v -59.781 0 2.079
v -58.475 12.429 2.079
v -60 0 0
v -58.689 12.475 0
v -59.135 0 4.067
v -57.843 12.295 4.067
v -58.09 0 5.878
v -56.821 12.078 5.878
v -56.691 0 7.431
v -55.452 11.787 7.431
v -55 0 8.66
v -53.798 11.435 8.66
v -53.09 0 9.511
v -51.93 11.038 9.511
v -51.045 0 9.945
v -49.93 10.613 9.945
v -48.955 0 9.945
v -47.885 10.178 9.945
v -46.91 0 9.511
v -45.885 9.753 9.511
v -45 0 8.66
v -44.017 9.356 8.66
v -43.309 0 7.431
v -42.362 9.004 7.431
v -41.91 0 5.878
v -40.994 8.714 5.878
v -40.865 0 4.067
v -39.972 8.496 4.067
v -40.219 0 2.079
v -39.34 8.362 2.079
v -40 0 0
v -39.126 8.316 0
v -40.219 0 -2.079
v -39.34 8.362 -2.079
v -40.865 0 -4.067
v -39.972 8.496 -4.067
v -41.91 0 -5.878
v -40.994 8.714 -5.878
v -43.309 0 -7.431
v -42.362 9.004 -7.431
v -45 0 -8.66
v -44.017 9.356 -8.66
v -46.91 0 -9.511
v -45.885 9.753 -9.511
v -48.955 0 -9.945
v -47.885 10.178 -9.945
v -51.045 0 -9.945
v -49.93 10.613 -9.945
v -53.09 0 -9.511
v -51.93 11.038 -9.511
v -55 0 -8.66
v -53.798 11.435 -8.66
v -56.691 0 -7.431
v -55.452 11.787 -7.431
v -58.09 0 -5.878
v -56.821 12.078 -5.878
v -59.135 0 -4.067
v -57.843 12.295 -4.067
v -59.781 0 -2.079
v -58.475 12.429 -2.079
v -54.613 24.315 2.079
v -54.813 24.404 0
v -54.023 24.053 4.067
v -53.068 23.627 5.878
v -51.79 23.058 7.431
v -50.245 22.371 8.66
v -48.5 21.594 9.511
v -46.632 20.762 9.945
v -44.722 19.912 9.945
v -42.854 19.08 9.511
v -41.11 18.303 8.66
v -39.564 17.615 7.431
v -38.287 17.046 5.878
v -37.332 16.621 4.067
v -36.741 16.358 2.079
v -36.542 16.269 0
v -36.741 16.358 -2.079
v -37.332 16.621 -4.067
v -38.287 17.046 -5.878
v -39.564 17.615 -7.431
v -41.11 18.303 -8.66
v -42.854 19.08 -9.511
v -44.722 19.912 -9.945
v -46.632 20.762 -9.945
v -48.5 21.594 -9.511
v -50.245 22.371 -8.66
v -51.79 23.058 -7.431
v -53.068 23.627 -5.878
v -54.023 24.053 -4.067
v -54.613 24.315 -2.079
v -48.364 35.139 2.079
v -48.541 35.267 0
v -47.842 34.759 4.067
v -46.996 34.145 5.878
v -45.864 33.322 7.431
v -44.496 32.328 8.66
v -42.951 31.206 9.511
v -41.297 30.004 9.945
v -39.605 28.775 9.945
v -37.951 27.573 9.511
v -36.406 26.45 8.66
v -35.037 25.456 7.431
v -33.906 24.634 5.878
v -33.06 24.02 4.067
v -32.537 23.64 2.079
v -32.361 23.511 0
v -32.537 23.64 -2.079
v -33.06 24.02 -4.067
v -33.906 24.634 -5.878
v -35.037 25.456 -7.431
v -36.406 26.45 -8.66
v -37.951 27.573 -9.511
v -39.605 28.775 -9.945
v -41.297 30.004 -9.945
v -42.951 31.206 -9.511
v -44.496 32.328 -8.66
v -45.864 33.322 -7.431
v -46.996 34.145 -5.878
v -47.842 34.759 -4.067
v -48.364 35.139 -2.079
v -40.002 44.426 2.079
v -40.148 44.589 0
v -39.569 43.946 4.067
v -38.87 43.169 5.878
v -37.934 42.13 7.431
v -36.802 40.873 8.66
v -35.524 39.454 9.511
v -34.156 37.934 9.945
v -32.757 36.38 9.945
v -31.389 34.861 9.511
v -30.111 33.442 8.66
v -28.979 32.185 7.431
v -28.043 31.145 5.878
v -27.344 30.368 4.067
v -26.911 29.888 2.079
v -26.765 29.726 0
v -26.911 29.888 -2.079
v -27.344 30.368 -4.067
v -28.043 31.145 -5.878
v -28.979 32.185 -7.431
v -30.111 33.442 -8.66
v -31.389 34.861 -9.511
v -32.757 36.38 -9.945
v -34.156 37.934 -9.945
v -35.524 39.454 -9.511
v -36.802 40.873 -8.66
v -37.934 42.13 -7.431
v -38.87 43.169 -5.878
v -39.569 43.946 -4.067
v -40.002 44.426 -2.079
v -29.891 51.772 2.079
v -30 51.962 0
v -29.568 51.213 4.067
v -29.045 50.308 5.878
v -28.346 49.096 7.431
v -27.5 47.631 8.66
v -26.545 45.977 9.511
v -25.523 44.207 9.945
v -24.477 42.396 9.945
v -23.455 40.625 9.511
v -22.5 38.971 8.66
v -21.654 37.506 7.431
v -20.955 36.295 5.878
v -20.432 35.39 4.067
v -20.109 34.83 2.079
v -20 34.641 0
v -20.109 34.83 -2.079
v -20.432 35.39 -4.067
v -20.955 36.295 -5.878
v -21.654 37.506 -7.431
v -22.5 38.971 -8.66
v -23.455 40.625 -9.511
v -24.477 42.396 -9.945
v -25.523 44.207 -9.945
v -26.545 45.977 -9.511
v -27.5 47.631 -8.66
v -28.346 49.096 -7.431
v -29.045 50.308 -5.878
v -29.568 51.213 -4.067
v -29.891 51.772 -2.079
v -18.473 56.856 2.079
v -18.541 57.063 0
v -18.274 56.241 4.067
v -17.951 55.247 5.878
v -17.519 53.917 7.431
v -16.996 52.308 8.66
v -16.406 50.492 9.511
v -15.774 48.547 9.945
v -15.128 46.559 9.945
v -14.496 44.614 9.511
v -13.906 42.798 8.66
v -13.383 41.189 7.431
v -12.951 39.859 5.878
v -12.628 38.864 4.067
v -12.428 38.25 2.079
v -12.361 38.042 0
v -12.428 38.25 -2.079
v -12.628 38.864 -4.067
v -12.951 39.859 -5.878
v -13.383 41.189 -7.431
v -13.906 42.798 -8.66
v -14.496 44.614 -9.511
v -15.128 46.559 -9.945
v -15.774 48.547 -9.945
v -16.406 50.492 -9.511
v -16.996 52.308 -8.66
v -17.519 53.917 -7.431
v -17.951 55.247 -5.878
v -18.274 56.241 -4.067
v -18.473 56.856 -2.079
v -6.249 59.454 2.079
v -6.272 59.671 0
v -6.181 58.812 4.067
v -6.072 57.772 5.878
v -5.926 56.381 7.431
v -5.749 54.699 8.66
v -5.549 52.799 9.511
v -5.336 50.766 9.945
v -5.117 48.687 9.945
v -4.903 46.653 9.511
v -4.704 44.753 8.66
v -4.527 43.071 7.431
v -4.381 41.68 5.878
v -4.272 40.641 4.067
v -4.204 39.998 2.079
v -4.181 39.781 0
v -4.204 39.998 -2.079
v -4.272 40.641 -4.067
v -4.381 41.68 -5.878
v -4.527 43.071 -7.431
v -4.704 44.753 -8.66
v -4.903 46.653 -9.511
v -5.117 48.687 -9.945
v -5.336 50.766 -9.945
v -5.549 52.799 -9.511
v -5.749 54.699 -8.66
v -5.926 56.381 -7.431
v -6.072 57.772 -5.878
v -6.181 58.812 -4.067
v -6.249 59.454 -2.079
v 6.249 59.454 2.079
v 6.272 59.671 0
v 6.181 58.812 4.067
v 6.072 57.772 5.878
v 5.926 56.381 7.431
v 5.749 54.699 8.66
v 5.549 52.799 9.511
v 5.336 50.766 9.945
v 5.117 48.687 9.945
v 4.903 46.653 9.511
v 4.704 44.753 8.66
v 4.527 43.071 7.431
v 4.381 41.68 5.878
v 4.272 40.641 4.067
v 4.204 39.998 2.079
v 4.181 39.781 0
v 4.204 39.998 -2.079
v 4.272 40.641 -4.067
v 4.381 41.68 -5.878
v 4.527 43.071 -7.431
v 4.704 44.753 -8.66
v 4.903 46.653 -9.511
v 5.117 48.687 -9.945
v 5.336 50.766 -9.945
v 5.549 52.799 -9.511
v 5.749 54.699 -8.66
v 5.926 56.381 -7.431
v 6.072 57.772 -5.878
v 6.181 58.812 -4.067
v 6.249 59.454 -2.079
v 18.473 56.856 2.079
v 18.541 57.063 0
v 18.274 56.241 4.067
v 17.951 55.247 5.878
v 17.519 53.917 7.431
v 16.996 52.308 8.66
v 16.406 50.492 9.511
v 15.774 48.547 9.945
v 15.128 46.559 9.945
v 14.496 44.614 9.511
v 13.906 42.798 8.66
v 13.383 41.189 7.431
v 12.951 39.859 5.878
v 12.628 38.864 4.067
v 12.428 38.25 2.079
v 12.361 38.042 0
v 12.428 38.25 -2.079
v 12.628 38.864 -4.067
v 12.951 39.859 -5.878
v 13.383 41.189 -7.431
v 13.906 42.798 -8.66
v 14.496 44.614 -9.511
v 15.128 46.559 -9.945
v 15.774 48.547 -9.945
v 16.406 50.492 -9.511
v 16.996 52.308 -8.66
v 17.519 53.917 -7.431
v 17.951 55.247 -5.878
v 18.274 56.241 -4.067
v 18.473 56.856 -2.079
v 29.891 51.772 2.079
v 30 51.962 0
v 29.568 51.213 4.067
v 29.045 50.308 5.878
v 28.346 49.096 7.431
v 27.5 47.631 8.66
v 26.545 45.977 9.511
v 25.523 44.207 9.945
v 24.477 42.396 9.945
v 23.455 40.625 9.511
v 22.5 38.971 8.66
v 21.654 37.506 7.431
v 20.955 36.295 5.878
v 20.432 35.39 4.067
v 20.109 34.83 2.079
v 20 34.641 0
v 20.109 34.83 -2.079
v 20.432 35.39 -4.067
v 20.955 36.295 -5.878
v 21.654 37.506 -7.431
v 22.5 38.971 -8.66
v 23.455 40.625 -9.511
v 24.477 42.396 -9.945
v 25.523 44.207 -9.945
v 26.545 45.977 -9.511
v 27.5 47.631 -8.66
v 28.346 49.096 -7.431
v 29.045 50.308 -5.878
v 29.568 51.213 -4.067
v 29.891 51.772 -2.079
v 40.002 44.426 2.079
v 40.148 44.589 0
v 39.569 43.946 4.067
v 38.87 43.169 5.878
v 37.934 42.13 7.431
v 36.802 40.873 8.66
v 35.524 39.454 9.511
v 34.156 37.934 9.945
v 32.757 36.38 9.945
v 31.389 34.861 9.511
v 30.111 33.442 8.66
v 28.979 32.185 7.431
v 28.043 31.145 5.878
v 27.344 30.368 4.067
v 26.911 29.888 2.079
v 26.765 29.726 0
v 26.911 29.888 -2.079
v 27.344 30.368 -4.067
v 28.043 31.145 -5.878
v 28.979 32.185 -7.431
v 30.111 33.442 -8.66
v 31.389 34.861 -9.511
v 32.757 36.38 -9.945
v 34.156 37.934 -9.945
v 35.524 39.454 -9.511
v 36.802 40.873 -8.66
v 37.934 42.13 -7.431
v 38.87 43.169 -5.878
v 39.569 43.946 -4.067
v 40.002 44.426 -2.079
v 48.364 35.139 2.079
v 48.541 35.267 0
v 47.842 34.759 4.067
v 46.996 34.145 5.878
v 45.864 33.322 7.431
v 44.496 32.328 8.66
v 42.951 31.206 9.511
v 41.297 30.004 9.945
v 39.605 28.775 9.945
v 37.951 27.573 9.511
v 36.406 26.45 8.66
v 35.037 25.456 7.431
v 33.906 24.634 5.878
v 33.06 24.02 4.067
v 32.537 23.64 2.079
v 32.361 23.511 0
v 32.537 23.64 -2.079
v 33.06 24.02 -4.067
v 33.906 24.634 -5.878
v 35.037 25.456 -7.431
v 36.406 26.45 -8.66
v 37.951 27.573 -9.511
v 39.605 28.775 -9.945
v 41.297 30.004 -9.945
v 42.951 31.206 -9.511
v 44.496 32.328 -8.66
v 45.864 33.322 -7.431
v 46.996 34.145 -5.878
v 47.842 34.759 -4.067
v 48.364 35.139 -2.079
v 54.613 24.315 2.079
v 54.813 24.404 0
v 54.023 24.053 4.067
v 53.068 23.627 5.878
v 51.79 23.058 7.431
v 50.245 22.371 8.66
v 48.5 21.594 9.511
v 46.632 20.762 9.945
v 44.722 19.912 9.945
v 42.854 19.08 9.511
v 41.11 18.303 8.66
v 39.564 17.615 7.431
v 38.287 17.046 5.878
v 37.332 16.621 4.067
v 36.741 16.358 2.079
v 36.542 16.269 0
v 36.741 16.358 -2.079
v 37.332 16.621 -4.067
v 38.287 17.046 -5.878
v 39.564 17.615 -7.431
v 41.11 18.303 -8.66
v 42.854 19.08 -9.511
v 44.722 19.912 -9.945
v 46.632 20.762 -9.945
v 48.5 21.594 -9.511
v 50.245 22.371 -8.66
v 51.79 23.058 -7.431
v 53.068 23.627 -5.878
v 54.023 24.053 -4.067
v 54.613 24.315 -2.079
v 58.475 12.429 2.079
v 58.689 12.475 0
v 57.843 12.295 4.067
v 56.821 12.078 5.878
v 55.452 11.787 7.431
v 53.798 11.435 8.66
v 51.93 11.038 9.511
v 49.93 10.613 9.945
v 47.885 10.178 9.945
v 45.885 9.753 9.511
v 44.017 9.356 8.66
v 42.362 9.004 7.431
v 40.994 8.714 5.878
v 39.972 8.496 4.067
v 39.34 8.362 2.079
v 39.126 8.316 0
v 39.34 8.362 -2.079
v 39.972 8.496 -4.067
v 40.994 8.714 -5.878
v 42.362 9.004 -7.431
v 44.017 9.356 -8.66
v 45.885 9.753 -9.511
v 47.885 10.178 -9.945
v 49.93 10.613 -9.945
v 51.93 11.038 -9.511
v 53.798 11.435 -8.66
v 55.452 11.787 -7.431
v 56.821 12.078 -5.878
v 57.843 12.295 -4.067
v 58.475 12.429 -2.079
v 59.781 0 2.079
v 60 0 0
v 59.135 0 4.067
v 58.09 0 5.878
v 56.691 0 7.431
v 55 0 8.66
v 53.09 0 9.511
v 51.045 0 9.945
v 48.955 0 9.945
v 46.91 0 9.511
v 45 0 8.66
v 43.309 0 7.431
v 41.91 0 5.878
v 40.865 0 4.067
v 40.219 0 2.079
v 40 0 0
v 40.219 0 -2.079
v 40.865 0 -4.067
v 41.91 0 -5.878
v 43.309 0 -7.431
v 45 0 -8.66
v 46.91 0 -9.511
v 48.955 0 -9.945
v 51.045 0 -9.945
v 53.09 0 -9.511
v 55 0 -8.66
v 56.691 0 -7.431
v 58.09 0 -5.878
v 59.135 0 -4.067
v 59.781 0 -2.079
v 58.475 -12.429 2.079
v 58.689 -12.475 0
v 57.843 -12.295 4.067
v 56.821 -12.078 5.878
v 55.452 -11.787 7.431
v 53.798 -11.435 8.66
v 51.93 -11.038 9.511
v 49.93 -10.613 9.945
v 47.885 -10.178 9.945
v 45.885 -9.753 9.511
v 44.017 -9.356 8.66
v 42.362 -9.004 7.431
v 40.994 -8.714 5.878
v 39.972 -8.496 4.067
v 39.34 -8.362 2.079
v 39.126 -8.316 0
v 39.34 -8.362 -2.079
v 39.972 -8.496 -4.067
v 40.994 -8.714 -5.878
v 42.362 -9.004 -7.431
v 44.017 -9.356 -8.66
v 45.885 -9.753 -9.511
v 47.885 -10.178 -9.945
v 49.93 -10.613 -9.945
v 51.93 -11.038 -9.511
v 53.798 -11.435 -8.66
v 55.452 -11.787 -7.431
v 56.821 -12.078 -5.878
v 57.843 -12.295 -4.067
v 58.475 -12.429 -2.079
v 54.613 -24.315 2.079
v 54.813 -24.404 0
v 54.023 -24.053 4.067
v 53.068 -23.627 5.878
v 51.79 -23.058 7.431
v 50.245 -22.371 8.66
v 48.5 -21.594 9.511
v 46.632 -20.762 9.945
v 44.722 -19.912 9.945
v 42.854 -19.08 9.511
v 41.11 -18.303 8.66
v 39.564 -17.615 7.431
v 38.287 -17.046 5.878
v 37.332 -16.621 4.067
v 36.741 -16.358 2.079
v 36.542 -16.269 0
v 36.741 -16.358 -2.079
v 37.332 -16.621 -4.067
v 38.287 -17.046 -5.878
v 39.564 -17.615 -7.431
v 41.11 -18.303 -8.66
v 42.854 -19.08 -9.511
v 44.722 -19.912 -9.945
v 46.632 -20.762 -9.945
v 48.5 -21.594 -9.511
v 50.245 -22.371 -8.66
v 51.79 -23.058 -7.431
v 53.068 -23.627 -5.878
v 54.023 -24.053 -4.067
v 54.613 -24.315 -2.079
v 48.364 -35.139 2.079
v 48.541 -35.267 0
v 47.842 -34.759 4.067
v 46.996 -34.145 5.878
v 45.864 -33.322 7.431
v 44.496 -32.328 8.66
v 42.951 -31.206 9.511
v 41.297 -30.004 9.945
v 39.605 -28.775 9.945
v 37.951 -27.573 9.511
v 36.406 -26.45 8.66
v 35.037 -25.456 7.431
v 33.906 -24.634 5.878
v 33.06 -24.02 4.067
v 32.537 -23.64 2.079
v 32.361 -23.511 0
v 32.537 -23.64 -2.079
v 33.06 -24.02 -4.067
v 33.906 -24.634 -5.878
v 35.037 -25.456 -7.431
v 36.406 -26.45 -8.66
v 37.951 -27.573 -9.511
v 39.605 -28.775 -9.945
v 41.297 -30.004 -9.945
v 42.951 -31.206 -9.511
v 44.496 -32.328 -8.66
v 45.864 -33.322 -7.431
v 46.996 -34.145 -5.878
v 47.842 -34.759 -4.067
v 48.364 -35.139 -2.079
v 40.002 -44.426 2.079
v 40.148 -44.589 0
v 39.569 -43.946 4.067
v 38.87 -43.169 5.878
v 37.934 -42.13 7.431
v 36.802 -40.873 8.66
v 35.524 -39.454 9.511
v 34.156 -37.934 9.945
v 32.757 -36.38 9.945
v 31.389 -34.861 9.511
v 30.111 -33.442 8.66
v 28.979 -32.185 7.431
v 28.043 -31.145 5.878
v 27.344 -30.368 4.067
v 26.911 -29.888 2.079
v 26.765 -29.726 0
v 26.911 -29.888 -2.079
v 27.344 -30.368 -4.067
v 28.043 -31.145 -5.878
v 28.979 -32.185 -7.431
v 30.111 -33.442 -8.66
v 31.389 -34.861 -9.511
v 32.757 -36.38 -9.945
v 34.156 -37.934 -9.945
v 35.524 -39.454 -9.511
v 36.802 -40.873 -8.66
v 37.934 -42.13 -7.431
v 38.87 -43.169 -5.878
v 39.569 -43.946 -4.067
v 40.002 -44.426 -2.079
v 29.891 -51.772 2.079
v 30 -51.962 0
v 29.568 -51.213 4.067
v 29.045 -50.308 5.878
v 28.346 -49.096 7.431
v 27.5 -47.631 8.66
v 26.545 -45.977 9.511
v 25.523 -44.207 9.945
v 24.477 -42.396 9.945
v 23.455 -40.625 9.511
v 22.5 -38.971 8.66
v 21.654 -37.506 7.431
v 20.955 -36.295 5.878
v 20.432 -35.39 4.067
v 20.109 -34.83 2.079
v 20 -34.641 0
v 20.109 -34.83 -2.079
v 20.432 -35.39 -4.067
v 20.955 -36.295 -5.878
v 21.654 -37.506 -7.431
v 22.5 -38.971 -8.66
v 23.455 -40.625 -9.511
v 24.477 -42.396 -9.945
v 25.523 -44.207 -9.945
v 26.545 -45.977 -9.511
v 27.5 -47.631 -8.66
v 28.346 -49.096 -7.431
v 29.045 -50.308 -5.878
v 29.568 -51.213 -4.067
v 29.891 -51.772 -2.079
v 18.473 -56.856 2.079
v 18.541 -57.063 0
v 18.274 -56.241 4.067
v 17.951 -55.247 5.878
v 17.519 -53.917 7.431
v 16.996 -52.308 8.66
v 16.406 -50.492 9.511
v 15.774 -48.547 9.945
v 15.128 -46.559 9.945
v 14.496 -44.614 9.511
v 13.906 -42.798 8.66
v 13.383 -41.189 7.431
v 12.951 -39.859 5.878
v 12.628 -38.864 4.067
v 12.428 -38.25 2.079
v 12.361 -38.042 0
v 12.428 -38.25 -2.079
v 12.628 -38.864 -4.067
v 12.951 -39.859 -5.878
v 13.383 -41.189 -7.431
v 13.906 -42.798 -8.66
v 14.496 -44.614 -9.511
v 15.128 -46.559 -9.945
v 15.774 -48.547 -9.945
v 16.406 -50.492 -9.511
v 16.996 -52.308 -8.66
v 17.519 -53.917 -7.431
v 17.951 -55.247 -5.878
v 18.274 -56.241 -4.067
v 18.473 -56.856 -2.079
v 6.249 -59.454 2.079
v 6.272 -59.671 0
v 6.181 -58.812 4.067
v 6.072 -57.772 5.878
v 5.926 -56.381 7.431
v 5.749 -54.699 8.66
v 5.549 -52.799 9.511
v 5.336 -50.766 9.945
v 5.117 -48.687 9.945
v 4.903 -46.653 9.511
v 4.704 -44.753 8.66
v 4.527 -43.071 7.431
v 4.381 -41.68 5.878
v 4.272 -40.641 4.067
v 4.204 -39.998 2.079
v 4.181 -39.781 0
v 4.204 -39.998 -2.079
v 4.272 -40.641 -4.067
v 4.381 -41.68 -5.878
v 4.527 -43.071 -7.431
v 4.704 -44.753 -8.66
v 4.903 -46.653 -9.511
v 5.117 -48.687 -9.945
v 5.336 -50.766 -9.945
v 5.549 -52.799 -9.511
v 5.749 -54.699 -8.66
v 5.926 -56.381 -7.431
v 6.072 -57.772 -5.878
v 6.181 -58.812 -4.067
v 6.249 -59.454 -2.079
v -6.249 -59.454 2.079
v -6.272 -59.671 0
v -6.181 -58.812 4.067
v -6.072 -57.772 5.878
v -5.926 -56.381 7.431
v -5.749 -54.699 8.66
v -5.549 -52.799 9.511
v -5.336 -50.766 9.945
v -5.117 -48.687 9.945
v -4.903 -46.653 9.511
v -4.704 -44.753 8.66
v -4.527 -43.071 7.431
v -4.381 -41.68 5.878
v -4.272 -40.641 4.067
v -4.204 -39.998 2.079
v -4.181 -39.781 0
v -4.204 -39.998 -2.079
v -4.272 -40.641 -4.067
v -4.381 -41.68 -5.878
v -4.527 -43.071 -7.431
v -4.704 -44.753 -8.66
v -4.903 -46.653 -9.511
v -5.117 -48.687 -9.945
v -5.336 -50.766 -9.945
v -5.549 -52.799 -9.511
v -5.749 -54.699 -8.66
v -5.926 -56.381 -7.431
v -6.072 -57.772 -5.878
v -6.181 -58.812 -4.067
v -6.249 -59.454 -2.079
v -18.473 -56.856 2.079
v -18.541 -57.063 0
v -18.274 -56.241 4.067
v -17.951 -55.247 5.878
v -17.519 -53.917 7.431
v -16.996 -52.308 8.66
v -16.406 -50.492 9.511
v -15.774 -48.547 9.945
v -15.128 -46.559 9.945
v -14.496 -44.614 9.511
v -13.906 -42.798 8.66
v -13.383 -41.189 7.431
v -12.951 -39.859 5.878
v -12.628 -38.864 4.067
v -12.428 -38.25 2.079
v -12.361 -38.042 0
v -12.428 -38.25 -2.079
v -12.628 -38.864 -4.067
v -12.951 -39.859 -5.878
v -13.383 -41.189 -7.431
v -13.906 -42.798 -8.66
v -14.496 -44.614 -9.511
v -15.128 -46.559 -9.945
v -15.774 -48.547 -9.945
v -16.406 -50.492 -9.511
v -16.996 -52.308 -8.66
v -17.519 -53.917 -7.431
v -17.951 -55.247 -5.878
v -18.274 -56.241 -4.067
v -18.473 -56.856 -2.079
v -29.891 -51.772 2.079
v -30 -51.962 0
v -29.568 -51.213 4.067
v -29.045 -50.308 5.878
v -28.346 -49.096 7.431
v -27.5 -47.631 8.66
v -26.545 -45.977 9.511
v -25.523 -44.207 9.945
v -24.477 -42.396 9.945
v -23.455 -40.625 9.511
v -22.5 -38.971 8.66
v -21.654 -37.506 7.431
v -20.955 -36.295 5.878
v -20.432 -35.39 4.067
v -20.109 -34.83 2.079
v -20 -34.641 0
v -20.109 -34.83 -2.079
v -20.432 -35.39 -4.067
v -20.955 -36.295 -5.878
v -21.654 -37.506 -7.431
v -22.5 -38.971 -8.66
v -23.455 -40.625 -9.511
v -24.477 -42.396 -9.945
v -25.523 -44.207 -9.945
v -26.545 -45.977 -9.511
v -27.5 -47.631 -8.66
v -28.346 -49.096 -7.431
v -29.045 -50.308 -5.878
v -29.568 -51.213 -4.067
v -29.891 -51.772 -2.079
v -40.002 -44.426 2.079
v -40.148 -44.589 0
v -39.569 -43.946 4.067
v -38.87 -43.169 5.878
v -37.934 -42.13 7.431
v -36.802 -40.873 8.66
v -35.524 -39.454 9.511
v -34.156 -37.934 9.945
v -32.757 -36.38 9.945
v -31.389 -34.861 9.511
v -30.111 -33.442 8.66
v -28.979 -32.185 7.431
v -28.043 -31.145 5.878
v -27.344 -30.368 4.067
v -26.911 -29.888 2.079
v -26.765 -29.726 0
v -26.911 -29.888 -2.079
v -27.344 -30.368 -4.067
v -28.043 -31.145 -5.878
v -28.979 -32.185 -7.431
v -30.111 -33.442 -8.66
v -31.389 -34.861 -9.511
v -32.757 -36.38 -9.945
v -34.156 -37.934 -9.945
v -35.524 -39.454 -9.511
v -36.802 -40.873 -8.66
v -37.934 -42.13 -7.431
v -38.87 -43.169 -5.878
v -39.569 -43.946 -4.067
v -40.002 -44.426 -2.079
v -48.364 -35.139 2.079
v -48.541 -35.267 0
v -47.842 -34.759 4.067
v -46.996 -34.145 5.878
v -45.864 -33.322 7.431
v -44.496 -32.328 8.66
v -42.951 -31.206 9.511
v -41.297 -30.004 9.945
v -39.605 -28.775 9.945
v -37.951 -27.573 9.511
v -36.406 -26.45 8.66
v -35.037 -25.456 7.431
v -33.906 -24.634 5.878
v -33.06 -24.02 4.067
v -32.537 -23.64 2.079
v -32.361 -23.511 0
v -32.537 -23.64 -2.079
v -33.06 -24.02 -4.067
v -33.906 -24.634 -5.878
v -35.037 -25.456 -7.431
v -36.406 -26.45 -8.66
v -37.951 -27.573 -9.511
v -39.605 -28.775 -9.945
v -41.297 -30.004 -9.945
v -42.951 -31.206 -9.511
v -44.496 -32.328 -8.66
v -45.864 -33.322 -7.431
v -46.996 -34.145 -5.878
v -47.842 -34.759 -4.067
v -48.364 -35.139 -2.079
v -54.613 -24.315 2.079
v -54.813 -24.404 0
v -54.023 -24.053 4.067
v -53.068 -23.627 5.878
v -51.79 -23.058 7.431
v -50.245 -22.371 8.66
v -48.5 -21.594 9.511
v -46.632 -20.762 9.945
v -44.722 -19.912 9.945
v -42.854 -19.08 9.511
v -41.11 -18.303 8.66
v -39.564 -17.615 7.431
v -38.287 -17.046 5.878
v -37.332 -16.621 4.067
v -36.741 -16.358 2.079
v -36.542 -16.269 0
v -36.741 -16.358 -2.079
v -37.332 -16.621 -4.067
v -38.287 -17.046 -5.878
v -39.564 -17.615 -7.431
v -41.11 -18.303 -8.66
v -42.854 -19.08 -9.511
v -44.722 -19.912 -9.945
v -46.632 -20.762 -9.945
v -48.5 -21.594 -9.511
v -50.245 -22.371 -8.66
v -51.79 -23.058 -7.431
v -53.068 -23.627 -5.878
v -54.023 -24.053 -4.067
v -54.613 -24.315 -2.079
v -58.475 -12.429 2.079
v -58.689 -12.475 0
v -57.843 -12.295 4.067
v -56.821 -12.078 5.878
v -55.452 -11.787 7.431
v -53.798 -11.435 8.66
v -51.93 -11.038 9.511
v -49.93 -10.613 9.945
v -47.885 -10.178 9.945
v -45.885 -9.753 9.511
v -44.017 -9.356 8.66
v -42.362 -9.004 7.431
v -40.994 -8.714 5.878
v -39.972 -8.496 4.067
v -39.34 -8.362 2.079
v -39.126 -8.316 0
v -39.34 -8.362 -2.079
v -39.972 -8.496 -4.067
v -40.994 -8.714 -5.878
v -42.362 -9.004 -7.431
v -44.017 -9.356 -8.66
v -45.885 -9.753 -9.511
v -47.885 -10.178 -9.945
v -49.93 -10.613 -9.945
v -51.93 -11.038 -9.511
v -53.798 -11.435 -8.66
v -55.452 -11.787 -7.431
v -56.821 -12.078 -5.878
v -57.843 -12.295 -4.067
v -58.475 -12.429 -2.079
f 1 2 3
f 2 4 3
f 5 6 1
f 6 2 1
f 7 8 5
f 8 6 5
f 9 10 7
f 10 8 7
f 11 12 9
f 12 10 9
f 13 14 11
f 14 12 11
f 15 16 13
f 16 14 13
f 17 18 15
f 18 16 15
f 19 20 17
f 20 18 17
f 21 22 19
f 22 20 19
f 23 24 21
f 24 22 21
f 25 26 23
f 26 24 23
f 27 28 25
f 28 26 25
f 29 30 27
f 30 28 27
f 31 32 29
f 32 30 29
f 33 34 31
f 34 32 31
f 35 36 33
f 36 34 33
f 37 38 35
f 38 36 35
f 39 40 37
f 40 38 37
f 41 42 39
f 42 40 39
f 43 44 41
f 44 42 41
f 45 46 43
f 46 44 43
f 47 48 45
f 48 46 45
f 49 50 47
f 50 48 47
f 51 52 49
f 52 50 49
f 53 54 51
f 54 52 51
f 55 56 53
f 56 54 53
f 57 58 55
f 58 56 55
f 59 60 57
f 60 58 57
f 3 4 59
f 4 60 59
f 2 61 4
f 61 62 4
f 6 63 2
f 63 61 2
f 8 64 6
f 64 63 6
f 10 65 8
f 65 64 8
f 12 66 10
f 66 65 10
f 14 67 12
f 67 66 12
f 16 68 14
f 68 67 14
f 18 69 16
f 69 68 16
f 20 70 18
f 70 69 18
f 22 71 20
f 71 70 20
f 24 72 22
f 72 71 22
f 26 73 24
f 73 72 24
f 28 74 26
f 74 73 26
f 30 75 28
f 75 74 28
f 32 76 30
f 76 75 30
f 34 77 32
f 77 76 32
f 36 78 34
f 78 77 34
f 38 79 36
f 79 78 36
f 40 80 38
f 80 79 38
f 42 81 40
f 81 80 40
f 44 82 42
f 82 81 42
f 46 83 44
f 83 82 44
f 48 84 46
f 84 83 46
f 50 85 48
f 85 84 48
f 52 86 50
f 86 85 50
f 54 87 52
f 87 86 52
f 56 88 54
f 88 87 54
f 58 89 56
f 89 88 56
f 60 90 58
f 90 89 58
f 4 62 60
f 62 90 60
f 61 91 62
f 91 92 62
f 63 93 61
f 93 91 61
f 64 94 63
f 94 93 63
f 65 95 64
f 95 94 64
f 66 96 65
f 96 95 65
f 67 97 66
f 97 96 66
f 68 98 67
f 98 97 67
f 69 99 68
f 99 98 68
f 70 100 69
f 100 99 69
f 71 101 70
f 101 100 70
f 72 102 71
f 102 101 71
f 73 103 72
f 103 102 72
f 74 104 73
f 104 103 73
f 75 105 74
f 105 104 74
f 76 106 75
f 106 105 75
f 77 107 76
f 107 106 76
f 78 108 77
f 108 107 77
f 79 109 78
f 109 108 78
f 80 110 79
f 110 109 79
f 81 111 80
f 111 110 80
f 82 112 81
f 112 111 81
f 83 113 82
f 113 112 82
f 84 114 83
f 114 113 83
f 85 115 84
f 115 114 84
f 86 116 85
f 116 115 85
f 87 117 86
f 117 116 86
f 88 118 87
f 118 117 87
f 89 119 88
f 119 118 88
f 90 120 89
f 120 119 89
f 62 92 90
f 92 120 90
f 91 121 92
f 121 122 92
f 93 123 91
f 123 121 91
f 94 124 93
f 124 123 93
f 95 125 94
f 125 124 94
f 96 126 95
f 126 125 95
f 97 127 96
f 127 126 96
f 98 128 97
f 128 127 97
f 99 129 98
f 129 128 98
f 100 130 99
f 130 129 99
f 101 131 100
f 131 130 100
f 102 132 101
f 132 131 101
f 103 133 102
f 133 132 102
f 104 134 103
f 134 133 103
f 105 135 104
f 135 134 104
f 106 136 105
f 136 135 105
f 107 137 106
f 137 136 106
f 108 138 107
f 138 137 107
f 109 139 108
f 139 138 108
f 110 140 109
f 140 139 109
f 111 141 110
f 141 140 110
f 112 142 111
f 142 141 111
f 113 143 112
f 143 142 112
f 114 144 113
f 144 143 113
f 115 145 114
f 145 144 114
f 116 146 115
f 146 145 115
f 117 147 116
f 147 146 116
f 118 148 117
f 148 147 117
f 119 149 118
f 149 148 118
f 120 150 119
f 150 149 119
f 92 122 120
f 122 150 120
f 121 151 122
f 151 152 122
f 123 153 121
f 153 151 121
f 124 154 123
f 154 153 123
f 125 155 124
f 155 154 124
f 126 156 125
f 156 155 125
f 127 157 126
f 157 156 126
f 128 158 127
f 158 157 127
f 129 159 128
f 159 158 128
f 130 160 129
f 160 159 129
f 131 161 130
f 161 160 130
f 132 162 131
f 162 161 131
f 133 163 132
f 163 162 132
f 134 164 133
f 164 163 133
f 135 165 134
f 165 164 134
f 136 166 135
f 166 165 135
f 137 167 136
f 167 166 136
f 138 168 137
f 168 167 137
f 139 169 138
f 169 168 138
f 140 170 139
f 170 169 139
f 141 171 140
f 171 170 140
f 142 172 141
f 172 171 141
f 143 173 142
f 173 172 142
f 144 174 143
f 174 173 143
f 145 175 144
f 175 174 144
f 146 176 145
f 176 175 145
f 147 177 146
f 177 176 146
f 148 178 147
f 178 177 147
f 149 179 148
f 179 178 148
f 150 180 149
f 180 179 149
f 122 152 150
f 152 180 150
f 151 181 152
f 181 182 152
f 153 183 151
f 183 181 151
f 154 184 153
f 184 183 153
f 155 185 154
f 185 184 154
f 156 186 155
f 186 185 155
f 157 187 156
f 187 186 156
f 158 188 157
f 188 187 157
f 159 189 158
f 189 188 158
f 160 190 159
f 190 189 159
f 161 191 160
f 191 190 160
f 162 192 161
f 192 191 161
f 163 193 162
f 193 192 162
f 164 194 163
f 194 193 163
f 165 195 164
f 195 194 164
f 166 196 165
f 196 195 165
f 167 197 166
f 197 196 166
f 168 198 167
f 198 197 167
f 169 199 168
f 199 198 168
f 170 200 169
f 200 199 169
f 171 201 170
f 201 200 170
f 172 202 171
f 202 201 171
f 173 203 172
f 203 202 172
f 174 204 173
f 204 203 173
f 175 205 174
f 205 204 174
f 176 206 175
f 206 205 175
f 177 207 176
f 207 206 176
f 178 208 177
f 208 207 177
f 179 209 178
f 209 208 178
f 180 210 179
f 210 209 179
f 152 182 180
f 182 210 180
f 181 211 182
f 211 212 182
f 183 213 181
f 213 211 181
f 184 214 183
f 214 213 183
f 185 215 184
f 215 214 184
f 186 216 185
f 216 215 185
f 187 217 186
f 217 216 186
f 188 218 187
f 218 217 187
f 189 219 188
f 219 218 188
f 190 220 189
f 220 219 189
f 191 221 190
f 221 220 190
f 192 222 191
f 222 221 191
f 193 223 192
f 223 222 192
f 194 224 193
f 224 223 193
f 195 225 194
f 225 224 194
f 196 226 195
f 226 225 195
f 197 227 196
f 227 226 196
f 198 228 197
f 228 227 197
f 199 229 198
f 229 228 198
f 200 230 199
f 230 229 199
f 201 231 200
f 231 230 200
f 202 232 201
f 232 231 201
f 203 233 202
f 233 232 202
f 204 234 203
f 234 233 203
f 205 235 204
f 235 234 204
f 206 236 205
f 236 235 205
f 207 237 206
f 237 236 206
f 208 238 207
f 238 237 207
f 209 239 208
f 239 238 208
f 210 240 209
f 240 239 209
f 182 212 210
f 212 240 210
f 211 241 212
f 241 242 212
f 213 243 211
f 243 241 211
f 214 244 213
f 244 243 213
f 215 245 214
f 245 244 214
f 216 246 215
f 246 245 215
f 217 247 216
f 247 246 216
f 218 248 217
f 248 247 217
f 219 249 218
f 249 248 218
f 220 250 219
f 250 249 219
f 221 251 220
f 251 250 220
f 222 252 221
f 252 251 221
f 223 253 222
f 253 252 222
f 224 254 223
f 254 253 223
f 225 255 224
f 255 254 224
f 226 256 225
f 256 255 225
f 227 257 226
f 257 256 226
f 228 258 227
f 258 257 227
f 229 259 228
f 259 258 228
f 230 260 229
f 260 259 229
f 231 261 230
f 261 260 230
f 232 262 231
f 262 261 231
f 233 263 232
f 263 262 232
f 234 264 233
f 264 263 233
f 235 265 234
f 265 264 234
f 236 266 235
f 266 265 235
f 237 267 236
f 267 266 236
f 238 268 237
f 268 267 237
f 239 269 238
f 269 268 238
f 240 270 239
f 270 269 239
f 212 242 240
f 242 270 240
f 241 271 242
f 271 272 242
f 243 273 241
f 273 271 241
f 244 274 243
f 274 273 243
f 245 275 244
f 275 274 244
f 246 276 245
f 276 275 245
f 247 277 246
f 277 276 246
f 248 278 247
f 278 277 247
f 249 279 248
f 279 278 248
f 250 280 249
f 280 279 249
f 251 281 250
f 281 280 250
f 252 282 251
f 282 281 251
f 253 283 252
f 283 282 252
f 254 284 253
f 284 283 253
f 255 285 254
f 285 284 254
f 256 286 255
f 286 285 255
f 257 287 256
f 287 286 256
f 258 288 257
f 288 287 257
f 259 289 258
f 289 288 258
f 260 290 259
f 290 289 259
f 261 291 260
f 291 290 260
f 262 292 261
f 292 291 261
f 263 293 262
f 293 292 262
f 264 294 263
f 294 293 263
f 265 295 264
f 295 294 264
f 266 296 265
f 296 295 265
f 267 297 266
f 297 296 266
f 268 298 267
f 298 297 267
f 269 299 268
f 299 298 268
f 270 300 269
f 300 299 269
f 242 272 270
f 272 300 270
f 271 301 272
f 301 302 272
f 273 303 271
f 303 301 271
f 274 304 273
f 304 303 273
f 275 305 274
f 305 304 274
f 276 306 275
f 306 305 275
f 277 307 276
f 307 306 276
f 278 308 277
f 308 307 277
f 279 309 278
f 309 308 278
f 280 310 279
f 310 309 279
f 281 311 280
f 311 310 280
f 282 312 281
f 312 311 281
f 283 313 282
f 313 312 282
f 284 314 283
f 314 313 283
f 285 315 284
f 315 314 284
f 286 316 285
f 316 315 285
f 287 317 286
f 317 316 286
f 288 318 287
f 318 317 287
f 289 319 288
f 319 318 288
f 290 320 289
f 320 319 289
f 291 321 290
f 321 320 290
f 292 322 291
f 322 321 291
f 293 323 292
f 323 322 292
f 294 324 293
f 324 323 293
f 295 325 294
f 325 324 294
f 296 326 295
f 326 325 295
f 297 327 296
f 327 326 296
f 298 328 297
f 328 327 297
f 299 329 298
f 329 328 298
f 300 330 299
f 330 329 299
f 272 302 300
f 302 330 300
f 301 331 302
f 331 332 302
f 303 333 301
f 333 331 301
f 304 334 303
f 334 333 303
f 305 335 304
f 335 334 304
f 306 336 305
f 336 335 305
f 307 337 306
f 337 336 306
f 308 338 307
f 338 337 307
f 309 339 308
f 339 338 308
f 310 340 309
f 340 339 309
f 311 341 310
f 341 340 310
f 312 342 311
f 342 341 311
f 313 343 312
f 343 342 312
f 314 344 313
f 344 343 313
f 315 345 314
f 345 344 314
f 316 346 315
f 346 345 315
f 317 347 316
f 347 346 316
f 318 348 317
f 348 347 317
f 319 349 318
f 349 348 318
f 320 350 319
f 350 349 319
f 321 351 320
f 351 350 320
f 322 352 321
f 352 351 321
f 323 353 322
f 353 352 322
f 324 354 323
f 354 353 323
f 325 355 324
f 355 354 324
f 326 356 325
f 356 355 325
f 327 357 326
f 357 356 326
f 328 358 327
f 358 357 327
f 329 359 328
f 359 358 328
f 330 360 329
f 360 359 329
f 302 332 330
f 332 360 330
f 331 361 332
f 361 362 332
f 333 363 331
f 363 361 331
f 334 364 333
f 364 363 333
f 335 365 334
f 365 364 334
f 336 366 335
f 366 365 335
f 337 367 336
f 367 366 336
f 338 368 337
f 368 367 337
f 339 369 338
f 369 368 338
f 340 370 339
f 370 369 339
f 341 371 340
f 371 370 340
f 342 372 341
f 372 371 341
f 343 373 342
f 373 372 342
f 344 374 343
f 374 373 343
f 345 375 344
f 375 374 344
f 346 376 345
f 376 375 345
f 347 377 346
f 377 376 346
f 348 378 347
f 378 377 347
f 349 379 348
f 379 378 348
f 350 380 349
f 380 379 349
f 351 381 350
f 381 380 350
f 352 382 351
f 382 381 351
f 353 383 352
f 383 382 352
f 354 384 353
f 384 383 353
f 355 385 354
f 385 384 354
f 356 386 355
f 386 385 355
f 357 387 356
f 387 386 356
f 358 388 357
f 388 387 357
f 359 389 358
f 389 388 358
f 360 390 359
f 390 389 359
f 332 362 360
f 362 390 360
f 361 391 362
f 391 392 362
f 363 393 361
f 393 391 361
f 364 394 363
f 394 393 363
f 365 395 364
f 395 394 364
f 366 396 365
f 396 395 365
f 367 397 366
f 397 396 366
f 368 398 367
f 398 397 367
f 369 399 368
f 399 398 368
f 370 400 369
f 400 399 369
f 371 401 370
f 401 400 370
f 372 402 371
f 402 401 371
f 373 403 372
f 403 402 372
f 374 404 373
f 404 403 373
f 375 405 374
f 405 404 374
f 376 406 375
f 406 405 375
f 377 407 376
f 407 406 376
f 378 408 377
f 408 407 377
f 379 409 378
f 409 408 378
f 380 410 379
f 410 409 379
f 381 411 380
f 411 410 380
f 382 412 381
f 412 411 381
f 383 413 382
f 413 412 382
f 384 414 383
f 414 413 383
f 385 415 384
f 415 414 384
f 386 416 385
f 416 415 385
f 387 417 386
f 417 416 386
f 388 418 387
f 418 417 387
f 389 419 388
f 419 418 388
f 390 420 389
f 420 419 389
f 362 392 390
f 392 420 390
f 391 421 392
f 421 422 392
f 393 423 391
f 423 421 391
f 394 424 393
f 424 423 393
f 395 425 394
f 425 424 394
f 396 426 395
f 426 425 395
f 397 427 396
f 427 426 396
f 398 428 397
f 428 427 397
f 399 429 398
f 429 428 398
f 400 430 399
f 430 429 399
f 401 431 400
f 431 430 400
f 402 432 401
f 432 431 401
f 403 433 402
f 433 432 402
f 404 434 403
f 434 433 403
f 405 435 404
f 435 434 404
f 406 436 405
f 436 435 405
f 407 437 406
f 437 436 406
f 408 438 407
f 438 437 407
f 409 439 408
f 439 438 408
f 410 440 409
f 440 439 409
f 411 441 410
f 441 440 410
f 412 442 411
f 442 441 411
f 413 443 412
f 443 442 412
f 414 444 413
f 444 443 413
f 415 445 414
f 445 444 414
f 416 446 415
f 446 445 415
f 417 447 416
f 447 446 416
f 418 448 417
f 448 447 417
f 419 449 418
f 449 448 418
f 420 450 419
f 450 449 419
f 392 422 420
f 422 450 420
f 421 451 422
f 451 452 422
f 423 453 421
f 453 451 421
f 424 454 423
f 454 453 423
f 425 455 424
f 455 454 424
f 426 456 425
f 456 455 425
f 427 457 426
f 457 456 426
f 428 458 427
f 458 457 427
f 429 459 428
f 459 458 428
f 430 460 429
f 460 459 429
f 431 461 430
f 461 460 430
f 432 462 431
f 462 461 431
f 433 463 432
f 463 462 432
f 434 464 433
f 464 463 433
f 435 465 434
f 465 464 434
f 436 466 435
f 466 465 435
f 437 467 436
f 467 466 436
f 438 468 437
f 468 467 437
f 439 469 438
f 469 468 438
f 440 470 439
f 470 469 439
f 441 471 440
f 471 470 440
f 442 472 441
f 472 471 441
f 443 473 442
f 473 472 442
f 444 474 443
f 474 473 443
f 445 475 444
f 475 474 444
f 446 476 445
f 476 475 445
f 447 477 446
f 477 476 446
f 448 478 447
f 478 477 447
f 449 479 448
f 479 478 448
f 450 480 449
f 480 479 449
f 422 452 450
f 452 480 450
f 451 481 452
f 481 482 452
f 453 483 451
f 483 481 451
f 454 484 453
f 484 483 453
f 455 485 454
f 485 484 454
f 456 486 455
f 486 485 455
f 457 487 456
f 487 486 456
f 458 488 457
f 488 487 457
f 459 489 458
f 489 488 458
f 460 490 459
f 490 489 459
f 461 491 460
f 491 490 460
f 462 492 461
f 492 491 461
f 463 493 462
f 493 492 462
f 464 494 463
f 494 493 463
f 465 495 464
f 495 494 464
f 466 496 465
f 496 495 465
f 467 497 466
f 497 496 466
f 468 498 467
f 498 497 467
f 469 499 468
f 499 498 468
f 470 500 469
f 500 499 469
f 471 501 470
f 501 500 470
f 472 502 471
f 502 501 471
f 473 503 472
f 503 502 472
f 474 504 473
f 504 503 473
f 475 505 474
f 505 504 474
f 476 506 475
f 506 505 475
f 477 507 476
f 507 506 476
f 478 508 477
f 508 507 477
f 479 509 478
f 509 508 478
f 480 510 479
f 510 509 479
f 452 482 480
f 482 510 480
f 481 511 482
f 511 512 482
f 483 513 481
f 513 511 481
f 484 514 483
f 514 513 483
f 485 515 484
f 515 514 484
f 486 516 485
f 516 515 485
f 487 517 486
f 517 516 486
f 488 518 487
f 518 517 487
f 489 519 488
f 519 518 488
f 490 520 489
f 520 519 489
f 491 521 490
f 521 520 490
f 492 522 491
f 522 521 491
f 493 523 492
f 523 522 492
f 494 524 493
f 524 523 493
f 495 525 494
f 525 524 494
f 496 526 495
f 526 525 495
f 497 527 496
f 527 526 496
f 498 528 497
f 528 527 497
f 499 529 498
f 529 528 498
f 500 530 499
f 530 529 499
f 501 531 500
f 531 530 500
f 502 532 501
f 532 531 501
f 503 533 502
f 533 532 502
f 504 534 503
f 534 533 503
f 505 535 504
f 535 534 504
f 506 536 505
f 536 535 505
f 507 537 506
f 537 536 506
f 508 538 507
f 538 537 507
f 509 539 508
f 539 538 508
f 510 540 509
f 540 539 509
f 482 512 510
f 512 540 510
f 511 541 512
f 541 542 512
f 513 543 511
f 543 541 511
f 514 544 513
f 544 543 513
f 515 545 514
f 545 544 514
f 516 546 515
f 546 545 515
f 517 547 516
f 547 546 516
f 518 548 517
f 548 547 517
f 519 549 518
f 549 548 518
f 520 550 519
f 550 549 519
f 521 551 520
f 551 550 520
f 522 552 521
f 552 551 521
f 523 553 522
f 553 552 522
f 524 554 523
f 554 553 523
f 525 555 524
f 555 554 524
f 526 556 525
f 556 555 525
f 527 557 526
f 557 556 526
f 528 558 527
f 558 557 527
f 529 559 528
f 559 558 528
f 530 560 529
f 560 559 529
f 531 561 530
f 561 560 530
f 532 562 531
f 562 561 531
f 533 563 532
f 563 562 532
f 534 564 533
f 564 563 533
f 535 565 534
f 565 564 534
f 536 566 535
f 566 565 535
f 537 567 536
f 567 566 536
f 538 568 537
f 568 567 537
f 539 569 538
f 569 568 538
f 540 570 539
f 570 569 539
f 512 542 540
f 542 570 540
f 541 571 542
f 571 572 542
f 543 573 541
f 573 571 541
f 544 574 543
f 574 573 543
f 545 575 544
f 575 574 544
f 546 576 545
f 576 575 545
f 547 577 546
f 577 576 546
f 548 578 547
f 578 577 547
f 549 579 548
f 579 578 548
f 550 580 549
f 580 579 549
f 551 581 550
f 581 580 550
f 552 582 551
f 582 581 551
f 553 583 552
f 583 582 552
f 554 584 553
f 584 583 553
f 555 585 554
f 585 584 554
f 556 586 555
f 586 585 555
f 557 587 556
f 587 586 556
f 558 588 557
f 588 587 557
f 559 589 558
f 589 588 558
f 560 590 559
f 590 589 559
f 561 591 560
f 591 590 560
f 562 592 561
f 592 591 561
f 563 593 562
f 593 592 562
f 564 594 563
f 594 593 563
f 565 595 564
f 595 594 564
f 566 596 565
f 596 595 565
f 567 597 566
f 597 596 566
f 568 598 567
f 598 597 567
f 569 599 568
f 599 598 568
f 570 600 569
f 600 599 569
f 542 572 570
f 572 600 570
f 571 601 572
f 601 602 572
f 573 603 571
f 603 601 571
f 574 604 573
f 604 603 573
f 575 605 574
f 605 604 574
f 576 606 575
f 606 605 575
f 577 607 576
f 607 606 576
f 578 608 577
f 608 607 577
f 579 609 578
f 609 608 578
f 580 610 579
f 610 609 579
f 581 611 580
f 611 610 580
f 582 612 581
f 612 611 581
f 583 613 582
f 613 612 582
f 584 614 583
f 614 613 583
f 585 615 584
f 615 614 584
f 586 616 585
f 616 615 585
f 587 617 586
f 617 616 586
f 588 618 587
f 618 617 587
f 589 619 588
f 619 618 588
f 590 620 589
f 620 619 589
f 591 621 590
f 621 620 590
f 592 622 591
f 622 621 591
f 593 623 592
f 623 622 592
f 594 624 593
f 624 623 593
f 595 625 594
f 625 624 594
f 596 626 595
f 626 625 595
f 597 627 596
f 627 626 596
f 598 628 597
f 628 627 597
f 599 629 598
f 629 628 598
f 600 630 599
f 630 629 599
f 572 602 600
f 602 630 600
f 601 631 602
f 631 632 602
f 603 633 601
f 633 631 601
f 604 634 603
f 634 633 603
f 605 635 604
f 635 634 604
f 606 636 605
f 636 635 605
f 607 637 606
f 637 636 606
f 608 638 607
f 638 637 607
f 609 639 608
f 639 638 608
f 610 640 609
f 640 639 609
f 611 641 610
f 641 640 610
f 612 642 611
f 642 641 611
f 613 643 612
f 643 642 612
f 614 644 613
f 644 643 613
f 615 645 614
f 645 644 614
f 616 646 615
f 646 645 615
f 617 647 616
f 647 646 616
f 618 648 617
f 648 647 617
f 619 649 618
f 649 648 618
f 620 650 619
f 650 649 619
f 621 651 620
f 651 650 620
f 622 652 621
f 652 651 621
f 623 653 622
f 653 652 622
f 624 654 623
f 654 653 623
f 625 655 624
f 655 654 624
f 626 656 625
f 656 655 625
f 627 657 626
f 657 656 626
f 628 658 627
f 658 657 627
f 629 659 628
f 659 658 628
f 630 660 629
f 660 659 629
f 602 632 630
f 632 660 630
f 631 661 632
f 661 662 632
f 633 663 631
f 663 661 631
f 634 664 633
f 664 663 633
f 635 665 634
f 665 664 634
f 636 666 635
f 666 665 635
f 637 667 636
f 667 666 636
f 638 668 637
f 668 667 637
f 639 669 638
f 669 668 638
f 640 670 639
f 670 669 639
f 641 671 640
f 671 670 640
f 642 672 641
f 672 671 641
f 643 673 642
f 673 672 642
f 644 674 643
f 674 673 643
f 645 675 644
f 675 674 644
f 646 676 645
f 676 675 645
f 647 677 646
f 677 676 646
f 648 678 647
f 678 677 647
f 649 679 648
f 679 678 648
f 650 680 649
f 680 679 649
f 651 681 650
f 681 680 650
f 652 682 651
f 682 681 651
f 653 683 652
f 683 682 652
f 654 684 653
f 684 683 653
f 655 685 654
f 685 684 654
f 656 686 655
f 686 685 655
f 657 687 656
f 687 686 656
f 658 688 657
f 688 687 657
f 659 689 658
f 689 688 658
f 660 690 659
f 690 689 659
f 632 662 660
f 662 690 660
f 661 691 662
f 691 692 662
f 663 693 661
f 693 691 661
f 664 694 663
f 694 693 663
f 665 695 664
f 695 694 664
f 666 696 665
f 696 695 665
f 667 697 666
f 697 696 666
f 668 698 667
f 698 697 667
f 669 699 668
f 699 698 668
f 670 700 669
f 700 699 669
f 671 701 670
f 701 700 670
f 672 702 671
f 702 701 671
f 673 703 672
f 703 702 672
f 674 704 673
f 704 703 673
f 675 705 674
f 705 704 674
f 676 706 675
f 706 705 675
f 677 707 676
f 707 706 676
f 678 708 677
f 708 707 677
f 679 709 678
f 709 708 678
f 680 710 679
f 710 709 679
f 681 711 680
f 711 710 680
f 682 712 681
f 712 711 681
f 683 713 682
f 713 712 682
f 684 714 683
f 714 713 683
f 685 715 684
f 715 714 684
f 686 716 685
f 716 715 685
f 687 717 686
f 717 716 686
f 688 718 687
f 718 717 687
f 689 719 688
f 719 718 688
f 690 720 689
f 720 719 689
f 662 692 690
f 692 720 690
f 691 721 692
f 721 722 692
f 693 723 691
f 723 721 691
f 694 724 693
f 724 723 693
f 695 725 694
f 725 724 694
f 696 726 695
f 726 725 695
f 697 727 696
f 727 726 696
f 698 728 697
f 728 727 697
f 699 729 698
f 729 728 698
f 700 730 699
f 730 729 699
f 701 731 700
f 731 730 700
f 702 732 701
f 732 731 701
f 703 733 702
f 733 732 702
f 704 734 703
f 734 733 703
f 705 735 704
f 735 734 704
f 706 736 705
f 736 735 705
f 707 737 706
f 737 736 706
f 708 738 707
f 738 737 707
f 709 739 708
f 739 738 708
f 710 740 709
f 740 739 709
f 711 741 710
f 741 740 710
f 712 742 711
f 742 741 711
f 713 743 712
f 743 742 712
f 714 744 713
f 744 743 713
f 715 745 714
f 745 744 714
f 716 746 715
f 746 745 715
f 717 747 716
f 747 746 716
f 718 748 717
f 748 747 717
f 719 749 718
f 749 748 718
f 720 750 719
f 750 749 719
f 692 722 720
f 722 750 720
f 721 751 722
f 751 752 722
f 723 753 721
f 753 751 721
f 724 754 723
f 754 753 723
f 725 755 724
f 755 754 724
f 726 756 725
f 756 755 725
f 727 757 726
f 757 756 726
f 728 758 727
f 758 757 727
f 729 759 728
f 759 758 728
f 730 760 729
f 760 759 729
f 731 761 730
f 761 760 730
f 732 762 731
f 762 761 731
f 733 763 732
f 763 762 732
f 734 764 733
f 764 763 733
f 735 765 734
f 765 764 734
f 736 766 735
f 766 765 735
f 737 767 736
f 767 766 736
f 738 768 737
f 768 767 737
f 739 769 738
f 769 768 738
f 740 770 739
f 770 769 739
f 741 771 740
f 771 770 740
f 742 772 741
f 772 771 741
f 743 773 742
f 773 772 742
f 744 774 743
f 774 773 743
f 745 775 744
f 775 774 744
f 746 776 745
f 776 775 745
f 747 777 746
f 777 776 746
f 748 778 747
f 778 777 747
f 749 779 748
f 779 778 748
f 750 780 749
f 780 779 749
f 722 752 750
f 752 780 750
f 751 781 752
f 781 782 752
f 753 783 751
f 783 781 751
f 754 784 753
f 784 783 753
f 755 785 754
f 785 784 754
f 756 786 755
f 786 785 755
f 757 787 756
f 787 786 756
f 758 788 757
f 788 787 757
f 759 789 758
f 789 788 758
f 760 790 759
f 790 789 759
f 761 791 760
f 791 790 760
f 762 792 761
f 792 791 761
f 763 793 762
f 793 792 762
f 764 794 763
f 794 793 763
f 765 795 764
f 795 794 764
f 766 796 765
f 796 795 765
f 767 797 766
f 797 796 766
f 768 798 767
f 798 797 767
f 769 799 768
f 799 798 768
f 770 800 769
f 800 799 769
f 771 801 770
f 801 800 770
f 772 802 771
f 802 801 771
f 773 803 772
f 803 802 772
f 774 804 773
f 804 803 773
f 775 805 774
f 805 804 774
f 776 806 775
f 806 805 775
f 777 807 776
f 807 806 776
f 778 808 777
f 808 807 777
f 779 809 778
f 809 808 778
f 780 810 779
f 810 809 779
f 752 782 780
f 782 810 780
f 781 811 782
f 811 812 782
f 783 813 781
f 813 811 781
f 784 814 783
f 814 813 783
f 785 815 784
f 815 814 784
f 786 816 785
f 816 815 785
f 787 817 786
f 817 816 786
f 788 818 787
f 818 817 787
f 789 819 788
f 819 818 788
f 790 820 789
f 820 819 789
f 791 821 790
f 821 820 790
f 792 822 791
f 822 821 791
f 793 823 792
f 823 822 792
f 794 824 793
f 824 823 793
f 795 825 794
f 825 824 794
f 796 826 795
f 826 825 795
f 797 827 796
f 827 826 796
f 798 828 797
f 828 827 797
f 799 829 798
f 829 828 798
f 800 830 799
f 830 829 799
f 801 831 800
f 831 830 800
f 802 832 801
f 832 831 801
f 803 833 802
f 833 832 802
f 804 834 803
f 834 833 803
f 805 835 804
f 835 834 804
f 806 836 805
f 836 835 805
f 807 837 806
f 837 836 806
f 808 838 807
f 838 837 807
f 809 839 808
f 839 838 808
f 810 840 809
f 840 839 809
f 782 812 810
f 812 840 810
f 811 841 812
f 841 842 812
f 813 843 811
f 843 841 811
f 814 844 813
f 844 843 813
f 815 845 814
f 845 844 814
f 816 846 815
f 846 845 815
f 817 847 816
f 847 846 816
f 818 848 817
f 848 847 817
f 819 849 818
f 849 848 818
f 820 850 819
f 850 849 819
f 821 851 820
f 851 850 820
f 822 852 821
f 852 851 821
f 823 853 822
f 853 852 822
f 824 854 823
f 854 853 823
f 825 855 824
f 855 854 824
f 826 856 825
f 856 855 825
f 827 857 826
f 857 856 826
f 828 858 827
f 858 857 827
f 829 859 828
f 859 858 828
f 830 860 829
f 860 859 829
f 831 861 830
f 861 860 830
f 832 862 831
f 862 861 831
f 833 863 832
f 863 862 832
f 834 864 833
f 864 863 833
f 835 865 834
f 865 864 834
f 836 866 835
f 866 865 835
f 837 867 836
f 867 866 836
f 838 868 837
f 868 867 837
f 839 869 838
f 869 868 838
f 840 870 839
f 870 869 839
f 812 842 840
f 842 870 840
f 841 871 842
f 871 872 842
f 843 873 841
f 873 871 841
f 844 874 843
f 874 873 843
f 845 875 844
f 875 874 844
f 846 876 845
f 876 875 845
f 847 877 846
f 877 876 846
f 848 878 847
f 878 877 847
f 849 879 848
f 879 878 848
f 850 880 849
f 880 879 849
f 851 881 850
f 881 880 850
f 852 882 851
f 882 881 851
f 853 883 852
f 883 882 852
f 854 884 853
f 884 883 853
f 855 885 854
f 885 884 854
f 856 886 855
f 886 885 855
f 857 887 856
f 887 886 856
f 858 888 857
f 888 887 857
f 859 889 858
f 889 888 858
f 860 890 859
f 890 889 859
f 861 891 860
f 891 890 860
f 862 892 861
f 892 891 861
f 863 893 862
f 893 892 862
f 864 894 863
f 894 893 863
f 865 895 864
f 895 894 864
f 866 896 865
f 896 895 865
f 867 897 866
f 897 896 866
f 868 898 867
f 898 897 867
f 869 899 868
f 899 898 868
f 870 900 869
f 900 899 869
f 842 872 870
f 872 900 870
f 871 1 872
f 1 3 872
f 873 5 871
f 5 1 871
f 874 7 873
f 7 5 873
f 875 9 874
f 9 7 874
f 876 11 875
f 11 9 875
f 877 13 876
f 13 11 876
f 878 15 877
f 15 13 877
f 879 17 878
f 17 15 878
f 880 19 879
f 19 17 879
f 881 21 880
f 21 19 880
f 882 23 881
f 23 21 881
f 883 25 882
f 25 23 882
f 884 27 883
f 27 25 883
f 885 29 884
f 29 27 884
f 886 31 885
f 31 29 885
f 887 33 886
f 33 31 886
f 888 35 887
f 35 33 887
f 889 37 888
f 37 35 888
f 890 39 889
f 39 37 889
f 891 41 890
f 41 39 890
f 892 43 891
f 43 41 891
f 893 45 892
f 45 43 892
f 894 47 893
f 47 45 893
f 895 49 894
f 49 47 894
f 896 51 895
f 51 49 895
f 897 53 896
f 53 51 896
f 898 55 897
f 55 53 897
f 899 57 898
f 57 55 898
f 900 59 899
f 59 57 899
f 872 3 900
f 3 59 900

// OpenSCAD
rotate_extrude(slices=100){
    translate([50,0,0])
    circle(r=10);
}
